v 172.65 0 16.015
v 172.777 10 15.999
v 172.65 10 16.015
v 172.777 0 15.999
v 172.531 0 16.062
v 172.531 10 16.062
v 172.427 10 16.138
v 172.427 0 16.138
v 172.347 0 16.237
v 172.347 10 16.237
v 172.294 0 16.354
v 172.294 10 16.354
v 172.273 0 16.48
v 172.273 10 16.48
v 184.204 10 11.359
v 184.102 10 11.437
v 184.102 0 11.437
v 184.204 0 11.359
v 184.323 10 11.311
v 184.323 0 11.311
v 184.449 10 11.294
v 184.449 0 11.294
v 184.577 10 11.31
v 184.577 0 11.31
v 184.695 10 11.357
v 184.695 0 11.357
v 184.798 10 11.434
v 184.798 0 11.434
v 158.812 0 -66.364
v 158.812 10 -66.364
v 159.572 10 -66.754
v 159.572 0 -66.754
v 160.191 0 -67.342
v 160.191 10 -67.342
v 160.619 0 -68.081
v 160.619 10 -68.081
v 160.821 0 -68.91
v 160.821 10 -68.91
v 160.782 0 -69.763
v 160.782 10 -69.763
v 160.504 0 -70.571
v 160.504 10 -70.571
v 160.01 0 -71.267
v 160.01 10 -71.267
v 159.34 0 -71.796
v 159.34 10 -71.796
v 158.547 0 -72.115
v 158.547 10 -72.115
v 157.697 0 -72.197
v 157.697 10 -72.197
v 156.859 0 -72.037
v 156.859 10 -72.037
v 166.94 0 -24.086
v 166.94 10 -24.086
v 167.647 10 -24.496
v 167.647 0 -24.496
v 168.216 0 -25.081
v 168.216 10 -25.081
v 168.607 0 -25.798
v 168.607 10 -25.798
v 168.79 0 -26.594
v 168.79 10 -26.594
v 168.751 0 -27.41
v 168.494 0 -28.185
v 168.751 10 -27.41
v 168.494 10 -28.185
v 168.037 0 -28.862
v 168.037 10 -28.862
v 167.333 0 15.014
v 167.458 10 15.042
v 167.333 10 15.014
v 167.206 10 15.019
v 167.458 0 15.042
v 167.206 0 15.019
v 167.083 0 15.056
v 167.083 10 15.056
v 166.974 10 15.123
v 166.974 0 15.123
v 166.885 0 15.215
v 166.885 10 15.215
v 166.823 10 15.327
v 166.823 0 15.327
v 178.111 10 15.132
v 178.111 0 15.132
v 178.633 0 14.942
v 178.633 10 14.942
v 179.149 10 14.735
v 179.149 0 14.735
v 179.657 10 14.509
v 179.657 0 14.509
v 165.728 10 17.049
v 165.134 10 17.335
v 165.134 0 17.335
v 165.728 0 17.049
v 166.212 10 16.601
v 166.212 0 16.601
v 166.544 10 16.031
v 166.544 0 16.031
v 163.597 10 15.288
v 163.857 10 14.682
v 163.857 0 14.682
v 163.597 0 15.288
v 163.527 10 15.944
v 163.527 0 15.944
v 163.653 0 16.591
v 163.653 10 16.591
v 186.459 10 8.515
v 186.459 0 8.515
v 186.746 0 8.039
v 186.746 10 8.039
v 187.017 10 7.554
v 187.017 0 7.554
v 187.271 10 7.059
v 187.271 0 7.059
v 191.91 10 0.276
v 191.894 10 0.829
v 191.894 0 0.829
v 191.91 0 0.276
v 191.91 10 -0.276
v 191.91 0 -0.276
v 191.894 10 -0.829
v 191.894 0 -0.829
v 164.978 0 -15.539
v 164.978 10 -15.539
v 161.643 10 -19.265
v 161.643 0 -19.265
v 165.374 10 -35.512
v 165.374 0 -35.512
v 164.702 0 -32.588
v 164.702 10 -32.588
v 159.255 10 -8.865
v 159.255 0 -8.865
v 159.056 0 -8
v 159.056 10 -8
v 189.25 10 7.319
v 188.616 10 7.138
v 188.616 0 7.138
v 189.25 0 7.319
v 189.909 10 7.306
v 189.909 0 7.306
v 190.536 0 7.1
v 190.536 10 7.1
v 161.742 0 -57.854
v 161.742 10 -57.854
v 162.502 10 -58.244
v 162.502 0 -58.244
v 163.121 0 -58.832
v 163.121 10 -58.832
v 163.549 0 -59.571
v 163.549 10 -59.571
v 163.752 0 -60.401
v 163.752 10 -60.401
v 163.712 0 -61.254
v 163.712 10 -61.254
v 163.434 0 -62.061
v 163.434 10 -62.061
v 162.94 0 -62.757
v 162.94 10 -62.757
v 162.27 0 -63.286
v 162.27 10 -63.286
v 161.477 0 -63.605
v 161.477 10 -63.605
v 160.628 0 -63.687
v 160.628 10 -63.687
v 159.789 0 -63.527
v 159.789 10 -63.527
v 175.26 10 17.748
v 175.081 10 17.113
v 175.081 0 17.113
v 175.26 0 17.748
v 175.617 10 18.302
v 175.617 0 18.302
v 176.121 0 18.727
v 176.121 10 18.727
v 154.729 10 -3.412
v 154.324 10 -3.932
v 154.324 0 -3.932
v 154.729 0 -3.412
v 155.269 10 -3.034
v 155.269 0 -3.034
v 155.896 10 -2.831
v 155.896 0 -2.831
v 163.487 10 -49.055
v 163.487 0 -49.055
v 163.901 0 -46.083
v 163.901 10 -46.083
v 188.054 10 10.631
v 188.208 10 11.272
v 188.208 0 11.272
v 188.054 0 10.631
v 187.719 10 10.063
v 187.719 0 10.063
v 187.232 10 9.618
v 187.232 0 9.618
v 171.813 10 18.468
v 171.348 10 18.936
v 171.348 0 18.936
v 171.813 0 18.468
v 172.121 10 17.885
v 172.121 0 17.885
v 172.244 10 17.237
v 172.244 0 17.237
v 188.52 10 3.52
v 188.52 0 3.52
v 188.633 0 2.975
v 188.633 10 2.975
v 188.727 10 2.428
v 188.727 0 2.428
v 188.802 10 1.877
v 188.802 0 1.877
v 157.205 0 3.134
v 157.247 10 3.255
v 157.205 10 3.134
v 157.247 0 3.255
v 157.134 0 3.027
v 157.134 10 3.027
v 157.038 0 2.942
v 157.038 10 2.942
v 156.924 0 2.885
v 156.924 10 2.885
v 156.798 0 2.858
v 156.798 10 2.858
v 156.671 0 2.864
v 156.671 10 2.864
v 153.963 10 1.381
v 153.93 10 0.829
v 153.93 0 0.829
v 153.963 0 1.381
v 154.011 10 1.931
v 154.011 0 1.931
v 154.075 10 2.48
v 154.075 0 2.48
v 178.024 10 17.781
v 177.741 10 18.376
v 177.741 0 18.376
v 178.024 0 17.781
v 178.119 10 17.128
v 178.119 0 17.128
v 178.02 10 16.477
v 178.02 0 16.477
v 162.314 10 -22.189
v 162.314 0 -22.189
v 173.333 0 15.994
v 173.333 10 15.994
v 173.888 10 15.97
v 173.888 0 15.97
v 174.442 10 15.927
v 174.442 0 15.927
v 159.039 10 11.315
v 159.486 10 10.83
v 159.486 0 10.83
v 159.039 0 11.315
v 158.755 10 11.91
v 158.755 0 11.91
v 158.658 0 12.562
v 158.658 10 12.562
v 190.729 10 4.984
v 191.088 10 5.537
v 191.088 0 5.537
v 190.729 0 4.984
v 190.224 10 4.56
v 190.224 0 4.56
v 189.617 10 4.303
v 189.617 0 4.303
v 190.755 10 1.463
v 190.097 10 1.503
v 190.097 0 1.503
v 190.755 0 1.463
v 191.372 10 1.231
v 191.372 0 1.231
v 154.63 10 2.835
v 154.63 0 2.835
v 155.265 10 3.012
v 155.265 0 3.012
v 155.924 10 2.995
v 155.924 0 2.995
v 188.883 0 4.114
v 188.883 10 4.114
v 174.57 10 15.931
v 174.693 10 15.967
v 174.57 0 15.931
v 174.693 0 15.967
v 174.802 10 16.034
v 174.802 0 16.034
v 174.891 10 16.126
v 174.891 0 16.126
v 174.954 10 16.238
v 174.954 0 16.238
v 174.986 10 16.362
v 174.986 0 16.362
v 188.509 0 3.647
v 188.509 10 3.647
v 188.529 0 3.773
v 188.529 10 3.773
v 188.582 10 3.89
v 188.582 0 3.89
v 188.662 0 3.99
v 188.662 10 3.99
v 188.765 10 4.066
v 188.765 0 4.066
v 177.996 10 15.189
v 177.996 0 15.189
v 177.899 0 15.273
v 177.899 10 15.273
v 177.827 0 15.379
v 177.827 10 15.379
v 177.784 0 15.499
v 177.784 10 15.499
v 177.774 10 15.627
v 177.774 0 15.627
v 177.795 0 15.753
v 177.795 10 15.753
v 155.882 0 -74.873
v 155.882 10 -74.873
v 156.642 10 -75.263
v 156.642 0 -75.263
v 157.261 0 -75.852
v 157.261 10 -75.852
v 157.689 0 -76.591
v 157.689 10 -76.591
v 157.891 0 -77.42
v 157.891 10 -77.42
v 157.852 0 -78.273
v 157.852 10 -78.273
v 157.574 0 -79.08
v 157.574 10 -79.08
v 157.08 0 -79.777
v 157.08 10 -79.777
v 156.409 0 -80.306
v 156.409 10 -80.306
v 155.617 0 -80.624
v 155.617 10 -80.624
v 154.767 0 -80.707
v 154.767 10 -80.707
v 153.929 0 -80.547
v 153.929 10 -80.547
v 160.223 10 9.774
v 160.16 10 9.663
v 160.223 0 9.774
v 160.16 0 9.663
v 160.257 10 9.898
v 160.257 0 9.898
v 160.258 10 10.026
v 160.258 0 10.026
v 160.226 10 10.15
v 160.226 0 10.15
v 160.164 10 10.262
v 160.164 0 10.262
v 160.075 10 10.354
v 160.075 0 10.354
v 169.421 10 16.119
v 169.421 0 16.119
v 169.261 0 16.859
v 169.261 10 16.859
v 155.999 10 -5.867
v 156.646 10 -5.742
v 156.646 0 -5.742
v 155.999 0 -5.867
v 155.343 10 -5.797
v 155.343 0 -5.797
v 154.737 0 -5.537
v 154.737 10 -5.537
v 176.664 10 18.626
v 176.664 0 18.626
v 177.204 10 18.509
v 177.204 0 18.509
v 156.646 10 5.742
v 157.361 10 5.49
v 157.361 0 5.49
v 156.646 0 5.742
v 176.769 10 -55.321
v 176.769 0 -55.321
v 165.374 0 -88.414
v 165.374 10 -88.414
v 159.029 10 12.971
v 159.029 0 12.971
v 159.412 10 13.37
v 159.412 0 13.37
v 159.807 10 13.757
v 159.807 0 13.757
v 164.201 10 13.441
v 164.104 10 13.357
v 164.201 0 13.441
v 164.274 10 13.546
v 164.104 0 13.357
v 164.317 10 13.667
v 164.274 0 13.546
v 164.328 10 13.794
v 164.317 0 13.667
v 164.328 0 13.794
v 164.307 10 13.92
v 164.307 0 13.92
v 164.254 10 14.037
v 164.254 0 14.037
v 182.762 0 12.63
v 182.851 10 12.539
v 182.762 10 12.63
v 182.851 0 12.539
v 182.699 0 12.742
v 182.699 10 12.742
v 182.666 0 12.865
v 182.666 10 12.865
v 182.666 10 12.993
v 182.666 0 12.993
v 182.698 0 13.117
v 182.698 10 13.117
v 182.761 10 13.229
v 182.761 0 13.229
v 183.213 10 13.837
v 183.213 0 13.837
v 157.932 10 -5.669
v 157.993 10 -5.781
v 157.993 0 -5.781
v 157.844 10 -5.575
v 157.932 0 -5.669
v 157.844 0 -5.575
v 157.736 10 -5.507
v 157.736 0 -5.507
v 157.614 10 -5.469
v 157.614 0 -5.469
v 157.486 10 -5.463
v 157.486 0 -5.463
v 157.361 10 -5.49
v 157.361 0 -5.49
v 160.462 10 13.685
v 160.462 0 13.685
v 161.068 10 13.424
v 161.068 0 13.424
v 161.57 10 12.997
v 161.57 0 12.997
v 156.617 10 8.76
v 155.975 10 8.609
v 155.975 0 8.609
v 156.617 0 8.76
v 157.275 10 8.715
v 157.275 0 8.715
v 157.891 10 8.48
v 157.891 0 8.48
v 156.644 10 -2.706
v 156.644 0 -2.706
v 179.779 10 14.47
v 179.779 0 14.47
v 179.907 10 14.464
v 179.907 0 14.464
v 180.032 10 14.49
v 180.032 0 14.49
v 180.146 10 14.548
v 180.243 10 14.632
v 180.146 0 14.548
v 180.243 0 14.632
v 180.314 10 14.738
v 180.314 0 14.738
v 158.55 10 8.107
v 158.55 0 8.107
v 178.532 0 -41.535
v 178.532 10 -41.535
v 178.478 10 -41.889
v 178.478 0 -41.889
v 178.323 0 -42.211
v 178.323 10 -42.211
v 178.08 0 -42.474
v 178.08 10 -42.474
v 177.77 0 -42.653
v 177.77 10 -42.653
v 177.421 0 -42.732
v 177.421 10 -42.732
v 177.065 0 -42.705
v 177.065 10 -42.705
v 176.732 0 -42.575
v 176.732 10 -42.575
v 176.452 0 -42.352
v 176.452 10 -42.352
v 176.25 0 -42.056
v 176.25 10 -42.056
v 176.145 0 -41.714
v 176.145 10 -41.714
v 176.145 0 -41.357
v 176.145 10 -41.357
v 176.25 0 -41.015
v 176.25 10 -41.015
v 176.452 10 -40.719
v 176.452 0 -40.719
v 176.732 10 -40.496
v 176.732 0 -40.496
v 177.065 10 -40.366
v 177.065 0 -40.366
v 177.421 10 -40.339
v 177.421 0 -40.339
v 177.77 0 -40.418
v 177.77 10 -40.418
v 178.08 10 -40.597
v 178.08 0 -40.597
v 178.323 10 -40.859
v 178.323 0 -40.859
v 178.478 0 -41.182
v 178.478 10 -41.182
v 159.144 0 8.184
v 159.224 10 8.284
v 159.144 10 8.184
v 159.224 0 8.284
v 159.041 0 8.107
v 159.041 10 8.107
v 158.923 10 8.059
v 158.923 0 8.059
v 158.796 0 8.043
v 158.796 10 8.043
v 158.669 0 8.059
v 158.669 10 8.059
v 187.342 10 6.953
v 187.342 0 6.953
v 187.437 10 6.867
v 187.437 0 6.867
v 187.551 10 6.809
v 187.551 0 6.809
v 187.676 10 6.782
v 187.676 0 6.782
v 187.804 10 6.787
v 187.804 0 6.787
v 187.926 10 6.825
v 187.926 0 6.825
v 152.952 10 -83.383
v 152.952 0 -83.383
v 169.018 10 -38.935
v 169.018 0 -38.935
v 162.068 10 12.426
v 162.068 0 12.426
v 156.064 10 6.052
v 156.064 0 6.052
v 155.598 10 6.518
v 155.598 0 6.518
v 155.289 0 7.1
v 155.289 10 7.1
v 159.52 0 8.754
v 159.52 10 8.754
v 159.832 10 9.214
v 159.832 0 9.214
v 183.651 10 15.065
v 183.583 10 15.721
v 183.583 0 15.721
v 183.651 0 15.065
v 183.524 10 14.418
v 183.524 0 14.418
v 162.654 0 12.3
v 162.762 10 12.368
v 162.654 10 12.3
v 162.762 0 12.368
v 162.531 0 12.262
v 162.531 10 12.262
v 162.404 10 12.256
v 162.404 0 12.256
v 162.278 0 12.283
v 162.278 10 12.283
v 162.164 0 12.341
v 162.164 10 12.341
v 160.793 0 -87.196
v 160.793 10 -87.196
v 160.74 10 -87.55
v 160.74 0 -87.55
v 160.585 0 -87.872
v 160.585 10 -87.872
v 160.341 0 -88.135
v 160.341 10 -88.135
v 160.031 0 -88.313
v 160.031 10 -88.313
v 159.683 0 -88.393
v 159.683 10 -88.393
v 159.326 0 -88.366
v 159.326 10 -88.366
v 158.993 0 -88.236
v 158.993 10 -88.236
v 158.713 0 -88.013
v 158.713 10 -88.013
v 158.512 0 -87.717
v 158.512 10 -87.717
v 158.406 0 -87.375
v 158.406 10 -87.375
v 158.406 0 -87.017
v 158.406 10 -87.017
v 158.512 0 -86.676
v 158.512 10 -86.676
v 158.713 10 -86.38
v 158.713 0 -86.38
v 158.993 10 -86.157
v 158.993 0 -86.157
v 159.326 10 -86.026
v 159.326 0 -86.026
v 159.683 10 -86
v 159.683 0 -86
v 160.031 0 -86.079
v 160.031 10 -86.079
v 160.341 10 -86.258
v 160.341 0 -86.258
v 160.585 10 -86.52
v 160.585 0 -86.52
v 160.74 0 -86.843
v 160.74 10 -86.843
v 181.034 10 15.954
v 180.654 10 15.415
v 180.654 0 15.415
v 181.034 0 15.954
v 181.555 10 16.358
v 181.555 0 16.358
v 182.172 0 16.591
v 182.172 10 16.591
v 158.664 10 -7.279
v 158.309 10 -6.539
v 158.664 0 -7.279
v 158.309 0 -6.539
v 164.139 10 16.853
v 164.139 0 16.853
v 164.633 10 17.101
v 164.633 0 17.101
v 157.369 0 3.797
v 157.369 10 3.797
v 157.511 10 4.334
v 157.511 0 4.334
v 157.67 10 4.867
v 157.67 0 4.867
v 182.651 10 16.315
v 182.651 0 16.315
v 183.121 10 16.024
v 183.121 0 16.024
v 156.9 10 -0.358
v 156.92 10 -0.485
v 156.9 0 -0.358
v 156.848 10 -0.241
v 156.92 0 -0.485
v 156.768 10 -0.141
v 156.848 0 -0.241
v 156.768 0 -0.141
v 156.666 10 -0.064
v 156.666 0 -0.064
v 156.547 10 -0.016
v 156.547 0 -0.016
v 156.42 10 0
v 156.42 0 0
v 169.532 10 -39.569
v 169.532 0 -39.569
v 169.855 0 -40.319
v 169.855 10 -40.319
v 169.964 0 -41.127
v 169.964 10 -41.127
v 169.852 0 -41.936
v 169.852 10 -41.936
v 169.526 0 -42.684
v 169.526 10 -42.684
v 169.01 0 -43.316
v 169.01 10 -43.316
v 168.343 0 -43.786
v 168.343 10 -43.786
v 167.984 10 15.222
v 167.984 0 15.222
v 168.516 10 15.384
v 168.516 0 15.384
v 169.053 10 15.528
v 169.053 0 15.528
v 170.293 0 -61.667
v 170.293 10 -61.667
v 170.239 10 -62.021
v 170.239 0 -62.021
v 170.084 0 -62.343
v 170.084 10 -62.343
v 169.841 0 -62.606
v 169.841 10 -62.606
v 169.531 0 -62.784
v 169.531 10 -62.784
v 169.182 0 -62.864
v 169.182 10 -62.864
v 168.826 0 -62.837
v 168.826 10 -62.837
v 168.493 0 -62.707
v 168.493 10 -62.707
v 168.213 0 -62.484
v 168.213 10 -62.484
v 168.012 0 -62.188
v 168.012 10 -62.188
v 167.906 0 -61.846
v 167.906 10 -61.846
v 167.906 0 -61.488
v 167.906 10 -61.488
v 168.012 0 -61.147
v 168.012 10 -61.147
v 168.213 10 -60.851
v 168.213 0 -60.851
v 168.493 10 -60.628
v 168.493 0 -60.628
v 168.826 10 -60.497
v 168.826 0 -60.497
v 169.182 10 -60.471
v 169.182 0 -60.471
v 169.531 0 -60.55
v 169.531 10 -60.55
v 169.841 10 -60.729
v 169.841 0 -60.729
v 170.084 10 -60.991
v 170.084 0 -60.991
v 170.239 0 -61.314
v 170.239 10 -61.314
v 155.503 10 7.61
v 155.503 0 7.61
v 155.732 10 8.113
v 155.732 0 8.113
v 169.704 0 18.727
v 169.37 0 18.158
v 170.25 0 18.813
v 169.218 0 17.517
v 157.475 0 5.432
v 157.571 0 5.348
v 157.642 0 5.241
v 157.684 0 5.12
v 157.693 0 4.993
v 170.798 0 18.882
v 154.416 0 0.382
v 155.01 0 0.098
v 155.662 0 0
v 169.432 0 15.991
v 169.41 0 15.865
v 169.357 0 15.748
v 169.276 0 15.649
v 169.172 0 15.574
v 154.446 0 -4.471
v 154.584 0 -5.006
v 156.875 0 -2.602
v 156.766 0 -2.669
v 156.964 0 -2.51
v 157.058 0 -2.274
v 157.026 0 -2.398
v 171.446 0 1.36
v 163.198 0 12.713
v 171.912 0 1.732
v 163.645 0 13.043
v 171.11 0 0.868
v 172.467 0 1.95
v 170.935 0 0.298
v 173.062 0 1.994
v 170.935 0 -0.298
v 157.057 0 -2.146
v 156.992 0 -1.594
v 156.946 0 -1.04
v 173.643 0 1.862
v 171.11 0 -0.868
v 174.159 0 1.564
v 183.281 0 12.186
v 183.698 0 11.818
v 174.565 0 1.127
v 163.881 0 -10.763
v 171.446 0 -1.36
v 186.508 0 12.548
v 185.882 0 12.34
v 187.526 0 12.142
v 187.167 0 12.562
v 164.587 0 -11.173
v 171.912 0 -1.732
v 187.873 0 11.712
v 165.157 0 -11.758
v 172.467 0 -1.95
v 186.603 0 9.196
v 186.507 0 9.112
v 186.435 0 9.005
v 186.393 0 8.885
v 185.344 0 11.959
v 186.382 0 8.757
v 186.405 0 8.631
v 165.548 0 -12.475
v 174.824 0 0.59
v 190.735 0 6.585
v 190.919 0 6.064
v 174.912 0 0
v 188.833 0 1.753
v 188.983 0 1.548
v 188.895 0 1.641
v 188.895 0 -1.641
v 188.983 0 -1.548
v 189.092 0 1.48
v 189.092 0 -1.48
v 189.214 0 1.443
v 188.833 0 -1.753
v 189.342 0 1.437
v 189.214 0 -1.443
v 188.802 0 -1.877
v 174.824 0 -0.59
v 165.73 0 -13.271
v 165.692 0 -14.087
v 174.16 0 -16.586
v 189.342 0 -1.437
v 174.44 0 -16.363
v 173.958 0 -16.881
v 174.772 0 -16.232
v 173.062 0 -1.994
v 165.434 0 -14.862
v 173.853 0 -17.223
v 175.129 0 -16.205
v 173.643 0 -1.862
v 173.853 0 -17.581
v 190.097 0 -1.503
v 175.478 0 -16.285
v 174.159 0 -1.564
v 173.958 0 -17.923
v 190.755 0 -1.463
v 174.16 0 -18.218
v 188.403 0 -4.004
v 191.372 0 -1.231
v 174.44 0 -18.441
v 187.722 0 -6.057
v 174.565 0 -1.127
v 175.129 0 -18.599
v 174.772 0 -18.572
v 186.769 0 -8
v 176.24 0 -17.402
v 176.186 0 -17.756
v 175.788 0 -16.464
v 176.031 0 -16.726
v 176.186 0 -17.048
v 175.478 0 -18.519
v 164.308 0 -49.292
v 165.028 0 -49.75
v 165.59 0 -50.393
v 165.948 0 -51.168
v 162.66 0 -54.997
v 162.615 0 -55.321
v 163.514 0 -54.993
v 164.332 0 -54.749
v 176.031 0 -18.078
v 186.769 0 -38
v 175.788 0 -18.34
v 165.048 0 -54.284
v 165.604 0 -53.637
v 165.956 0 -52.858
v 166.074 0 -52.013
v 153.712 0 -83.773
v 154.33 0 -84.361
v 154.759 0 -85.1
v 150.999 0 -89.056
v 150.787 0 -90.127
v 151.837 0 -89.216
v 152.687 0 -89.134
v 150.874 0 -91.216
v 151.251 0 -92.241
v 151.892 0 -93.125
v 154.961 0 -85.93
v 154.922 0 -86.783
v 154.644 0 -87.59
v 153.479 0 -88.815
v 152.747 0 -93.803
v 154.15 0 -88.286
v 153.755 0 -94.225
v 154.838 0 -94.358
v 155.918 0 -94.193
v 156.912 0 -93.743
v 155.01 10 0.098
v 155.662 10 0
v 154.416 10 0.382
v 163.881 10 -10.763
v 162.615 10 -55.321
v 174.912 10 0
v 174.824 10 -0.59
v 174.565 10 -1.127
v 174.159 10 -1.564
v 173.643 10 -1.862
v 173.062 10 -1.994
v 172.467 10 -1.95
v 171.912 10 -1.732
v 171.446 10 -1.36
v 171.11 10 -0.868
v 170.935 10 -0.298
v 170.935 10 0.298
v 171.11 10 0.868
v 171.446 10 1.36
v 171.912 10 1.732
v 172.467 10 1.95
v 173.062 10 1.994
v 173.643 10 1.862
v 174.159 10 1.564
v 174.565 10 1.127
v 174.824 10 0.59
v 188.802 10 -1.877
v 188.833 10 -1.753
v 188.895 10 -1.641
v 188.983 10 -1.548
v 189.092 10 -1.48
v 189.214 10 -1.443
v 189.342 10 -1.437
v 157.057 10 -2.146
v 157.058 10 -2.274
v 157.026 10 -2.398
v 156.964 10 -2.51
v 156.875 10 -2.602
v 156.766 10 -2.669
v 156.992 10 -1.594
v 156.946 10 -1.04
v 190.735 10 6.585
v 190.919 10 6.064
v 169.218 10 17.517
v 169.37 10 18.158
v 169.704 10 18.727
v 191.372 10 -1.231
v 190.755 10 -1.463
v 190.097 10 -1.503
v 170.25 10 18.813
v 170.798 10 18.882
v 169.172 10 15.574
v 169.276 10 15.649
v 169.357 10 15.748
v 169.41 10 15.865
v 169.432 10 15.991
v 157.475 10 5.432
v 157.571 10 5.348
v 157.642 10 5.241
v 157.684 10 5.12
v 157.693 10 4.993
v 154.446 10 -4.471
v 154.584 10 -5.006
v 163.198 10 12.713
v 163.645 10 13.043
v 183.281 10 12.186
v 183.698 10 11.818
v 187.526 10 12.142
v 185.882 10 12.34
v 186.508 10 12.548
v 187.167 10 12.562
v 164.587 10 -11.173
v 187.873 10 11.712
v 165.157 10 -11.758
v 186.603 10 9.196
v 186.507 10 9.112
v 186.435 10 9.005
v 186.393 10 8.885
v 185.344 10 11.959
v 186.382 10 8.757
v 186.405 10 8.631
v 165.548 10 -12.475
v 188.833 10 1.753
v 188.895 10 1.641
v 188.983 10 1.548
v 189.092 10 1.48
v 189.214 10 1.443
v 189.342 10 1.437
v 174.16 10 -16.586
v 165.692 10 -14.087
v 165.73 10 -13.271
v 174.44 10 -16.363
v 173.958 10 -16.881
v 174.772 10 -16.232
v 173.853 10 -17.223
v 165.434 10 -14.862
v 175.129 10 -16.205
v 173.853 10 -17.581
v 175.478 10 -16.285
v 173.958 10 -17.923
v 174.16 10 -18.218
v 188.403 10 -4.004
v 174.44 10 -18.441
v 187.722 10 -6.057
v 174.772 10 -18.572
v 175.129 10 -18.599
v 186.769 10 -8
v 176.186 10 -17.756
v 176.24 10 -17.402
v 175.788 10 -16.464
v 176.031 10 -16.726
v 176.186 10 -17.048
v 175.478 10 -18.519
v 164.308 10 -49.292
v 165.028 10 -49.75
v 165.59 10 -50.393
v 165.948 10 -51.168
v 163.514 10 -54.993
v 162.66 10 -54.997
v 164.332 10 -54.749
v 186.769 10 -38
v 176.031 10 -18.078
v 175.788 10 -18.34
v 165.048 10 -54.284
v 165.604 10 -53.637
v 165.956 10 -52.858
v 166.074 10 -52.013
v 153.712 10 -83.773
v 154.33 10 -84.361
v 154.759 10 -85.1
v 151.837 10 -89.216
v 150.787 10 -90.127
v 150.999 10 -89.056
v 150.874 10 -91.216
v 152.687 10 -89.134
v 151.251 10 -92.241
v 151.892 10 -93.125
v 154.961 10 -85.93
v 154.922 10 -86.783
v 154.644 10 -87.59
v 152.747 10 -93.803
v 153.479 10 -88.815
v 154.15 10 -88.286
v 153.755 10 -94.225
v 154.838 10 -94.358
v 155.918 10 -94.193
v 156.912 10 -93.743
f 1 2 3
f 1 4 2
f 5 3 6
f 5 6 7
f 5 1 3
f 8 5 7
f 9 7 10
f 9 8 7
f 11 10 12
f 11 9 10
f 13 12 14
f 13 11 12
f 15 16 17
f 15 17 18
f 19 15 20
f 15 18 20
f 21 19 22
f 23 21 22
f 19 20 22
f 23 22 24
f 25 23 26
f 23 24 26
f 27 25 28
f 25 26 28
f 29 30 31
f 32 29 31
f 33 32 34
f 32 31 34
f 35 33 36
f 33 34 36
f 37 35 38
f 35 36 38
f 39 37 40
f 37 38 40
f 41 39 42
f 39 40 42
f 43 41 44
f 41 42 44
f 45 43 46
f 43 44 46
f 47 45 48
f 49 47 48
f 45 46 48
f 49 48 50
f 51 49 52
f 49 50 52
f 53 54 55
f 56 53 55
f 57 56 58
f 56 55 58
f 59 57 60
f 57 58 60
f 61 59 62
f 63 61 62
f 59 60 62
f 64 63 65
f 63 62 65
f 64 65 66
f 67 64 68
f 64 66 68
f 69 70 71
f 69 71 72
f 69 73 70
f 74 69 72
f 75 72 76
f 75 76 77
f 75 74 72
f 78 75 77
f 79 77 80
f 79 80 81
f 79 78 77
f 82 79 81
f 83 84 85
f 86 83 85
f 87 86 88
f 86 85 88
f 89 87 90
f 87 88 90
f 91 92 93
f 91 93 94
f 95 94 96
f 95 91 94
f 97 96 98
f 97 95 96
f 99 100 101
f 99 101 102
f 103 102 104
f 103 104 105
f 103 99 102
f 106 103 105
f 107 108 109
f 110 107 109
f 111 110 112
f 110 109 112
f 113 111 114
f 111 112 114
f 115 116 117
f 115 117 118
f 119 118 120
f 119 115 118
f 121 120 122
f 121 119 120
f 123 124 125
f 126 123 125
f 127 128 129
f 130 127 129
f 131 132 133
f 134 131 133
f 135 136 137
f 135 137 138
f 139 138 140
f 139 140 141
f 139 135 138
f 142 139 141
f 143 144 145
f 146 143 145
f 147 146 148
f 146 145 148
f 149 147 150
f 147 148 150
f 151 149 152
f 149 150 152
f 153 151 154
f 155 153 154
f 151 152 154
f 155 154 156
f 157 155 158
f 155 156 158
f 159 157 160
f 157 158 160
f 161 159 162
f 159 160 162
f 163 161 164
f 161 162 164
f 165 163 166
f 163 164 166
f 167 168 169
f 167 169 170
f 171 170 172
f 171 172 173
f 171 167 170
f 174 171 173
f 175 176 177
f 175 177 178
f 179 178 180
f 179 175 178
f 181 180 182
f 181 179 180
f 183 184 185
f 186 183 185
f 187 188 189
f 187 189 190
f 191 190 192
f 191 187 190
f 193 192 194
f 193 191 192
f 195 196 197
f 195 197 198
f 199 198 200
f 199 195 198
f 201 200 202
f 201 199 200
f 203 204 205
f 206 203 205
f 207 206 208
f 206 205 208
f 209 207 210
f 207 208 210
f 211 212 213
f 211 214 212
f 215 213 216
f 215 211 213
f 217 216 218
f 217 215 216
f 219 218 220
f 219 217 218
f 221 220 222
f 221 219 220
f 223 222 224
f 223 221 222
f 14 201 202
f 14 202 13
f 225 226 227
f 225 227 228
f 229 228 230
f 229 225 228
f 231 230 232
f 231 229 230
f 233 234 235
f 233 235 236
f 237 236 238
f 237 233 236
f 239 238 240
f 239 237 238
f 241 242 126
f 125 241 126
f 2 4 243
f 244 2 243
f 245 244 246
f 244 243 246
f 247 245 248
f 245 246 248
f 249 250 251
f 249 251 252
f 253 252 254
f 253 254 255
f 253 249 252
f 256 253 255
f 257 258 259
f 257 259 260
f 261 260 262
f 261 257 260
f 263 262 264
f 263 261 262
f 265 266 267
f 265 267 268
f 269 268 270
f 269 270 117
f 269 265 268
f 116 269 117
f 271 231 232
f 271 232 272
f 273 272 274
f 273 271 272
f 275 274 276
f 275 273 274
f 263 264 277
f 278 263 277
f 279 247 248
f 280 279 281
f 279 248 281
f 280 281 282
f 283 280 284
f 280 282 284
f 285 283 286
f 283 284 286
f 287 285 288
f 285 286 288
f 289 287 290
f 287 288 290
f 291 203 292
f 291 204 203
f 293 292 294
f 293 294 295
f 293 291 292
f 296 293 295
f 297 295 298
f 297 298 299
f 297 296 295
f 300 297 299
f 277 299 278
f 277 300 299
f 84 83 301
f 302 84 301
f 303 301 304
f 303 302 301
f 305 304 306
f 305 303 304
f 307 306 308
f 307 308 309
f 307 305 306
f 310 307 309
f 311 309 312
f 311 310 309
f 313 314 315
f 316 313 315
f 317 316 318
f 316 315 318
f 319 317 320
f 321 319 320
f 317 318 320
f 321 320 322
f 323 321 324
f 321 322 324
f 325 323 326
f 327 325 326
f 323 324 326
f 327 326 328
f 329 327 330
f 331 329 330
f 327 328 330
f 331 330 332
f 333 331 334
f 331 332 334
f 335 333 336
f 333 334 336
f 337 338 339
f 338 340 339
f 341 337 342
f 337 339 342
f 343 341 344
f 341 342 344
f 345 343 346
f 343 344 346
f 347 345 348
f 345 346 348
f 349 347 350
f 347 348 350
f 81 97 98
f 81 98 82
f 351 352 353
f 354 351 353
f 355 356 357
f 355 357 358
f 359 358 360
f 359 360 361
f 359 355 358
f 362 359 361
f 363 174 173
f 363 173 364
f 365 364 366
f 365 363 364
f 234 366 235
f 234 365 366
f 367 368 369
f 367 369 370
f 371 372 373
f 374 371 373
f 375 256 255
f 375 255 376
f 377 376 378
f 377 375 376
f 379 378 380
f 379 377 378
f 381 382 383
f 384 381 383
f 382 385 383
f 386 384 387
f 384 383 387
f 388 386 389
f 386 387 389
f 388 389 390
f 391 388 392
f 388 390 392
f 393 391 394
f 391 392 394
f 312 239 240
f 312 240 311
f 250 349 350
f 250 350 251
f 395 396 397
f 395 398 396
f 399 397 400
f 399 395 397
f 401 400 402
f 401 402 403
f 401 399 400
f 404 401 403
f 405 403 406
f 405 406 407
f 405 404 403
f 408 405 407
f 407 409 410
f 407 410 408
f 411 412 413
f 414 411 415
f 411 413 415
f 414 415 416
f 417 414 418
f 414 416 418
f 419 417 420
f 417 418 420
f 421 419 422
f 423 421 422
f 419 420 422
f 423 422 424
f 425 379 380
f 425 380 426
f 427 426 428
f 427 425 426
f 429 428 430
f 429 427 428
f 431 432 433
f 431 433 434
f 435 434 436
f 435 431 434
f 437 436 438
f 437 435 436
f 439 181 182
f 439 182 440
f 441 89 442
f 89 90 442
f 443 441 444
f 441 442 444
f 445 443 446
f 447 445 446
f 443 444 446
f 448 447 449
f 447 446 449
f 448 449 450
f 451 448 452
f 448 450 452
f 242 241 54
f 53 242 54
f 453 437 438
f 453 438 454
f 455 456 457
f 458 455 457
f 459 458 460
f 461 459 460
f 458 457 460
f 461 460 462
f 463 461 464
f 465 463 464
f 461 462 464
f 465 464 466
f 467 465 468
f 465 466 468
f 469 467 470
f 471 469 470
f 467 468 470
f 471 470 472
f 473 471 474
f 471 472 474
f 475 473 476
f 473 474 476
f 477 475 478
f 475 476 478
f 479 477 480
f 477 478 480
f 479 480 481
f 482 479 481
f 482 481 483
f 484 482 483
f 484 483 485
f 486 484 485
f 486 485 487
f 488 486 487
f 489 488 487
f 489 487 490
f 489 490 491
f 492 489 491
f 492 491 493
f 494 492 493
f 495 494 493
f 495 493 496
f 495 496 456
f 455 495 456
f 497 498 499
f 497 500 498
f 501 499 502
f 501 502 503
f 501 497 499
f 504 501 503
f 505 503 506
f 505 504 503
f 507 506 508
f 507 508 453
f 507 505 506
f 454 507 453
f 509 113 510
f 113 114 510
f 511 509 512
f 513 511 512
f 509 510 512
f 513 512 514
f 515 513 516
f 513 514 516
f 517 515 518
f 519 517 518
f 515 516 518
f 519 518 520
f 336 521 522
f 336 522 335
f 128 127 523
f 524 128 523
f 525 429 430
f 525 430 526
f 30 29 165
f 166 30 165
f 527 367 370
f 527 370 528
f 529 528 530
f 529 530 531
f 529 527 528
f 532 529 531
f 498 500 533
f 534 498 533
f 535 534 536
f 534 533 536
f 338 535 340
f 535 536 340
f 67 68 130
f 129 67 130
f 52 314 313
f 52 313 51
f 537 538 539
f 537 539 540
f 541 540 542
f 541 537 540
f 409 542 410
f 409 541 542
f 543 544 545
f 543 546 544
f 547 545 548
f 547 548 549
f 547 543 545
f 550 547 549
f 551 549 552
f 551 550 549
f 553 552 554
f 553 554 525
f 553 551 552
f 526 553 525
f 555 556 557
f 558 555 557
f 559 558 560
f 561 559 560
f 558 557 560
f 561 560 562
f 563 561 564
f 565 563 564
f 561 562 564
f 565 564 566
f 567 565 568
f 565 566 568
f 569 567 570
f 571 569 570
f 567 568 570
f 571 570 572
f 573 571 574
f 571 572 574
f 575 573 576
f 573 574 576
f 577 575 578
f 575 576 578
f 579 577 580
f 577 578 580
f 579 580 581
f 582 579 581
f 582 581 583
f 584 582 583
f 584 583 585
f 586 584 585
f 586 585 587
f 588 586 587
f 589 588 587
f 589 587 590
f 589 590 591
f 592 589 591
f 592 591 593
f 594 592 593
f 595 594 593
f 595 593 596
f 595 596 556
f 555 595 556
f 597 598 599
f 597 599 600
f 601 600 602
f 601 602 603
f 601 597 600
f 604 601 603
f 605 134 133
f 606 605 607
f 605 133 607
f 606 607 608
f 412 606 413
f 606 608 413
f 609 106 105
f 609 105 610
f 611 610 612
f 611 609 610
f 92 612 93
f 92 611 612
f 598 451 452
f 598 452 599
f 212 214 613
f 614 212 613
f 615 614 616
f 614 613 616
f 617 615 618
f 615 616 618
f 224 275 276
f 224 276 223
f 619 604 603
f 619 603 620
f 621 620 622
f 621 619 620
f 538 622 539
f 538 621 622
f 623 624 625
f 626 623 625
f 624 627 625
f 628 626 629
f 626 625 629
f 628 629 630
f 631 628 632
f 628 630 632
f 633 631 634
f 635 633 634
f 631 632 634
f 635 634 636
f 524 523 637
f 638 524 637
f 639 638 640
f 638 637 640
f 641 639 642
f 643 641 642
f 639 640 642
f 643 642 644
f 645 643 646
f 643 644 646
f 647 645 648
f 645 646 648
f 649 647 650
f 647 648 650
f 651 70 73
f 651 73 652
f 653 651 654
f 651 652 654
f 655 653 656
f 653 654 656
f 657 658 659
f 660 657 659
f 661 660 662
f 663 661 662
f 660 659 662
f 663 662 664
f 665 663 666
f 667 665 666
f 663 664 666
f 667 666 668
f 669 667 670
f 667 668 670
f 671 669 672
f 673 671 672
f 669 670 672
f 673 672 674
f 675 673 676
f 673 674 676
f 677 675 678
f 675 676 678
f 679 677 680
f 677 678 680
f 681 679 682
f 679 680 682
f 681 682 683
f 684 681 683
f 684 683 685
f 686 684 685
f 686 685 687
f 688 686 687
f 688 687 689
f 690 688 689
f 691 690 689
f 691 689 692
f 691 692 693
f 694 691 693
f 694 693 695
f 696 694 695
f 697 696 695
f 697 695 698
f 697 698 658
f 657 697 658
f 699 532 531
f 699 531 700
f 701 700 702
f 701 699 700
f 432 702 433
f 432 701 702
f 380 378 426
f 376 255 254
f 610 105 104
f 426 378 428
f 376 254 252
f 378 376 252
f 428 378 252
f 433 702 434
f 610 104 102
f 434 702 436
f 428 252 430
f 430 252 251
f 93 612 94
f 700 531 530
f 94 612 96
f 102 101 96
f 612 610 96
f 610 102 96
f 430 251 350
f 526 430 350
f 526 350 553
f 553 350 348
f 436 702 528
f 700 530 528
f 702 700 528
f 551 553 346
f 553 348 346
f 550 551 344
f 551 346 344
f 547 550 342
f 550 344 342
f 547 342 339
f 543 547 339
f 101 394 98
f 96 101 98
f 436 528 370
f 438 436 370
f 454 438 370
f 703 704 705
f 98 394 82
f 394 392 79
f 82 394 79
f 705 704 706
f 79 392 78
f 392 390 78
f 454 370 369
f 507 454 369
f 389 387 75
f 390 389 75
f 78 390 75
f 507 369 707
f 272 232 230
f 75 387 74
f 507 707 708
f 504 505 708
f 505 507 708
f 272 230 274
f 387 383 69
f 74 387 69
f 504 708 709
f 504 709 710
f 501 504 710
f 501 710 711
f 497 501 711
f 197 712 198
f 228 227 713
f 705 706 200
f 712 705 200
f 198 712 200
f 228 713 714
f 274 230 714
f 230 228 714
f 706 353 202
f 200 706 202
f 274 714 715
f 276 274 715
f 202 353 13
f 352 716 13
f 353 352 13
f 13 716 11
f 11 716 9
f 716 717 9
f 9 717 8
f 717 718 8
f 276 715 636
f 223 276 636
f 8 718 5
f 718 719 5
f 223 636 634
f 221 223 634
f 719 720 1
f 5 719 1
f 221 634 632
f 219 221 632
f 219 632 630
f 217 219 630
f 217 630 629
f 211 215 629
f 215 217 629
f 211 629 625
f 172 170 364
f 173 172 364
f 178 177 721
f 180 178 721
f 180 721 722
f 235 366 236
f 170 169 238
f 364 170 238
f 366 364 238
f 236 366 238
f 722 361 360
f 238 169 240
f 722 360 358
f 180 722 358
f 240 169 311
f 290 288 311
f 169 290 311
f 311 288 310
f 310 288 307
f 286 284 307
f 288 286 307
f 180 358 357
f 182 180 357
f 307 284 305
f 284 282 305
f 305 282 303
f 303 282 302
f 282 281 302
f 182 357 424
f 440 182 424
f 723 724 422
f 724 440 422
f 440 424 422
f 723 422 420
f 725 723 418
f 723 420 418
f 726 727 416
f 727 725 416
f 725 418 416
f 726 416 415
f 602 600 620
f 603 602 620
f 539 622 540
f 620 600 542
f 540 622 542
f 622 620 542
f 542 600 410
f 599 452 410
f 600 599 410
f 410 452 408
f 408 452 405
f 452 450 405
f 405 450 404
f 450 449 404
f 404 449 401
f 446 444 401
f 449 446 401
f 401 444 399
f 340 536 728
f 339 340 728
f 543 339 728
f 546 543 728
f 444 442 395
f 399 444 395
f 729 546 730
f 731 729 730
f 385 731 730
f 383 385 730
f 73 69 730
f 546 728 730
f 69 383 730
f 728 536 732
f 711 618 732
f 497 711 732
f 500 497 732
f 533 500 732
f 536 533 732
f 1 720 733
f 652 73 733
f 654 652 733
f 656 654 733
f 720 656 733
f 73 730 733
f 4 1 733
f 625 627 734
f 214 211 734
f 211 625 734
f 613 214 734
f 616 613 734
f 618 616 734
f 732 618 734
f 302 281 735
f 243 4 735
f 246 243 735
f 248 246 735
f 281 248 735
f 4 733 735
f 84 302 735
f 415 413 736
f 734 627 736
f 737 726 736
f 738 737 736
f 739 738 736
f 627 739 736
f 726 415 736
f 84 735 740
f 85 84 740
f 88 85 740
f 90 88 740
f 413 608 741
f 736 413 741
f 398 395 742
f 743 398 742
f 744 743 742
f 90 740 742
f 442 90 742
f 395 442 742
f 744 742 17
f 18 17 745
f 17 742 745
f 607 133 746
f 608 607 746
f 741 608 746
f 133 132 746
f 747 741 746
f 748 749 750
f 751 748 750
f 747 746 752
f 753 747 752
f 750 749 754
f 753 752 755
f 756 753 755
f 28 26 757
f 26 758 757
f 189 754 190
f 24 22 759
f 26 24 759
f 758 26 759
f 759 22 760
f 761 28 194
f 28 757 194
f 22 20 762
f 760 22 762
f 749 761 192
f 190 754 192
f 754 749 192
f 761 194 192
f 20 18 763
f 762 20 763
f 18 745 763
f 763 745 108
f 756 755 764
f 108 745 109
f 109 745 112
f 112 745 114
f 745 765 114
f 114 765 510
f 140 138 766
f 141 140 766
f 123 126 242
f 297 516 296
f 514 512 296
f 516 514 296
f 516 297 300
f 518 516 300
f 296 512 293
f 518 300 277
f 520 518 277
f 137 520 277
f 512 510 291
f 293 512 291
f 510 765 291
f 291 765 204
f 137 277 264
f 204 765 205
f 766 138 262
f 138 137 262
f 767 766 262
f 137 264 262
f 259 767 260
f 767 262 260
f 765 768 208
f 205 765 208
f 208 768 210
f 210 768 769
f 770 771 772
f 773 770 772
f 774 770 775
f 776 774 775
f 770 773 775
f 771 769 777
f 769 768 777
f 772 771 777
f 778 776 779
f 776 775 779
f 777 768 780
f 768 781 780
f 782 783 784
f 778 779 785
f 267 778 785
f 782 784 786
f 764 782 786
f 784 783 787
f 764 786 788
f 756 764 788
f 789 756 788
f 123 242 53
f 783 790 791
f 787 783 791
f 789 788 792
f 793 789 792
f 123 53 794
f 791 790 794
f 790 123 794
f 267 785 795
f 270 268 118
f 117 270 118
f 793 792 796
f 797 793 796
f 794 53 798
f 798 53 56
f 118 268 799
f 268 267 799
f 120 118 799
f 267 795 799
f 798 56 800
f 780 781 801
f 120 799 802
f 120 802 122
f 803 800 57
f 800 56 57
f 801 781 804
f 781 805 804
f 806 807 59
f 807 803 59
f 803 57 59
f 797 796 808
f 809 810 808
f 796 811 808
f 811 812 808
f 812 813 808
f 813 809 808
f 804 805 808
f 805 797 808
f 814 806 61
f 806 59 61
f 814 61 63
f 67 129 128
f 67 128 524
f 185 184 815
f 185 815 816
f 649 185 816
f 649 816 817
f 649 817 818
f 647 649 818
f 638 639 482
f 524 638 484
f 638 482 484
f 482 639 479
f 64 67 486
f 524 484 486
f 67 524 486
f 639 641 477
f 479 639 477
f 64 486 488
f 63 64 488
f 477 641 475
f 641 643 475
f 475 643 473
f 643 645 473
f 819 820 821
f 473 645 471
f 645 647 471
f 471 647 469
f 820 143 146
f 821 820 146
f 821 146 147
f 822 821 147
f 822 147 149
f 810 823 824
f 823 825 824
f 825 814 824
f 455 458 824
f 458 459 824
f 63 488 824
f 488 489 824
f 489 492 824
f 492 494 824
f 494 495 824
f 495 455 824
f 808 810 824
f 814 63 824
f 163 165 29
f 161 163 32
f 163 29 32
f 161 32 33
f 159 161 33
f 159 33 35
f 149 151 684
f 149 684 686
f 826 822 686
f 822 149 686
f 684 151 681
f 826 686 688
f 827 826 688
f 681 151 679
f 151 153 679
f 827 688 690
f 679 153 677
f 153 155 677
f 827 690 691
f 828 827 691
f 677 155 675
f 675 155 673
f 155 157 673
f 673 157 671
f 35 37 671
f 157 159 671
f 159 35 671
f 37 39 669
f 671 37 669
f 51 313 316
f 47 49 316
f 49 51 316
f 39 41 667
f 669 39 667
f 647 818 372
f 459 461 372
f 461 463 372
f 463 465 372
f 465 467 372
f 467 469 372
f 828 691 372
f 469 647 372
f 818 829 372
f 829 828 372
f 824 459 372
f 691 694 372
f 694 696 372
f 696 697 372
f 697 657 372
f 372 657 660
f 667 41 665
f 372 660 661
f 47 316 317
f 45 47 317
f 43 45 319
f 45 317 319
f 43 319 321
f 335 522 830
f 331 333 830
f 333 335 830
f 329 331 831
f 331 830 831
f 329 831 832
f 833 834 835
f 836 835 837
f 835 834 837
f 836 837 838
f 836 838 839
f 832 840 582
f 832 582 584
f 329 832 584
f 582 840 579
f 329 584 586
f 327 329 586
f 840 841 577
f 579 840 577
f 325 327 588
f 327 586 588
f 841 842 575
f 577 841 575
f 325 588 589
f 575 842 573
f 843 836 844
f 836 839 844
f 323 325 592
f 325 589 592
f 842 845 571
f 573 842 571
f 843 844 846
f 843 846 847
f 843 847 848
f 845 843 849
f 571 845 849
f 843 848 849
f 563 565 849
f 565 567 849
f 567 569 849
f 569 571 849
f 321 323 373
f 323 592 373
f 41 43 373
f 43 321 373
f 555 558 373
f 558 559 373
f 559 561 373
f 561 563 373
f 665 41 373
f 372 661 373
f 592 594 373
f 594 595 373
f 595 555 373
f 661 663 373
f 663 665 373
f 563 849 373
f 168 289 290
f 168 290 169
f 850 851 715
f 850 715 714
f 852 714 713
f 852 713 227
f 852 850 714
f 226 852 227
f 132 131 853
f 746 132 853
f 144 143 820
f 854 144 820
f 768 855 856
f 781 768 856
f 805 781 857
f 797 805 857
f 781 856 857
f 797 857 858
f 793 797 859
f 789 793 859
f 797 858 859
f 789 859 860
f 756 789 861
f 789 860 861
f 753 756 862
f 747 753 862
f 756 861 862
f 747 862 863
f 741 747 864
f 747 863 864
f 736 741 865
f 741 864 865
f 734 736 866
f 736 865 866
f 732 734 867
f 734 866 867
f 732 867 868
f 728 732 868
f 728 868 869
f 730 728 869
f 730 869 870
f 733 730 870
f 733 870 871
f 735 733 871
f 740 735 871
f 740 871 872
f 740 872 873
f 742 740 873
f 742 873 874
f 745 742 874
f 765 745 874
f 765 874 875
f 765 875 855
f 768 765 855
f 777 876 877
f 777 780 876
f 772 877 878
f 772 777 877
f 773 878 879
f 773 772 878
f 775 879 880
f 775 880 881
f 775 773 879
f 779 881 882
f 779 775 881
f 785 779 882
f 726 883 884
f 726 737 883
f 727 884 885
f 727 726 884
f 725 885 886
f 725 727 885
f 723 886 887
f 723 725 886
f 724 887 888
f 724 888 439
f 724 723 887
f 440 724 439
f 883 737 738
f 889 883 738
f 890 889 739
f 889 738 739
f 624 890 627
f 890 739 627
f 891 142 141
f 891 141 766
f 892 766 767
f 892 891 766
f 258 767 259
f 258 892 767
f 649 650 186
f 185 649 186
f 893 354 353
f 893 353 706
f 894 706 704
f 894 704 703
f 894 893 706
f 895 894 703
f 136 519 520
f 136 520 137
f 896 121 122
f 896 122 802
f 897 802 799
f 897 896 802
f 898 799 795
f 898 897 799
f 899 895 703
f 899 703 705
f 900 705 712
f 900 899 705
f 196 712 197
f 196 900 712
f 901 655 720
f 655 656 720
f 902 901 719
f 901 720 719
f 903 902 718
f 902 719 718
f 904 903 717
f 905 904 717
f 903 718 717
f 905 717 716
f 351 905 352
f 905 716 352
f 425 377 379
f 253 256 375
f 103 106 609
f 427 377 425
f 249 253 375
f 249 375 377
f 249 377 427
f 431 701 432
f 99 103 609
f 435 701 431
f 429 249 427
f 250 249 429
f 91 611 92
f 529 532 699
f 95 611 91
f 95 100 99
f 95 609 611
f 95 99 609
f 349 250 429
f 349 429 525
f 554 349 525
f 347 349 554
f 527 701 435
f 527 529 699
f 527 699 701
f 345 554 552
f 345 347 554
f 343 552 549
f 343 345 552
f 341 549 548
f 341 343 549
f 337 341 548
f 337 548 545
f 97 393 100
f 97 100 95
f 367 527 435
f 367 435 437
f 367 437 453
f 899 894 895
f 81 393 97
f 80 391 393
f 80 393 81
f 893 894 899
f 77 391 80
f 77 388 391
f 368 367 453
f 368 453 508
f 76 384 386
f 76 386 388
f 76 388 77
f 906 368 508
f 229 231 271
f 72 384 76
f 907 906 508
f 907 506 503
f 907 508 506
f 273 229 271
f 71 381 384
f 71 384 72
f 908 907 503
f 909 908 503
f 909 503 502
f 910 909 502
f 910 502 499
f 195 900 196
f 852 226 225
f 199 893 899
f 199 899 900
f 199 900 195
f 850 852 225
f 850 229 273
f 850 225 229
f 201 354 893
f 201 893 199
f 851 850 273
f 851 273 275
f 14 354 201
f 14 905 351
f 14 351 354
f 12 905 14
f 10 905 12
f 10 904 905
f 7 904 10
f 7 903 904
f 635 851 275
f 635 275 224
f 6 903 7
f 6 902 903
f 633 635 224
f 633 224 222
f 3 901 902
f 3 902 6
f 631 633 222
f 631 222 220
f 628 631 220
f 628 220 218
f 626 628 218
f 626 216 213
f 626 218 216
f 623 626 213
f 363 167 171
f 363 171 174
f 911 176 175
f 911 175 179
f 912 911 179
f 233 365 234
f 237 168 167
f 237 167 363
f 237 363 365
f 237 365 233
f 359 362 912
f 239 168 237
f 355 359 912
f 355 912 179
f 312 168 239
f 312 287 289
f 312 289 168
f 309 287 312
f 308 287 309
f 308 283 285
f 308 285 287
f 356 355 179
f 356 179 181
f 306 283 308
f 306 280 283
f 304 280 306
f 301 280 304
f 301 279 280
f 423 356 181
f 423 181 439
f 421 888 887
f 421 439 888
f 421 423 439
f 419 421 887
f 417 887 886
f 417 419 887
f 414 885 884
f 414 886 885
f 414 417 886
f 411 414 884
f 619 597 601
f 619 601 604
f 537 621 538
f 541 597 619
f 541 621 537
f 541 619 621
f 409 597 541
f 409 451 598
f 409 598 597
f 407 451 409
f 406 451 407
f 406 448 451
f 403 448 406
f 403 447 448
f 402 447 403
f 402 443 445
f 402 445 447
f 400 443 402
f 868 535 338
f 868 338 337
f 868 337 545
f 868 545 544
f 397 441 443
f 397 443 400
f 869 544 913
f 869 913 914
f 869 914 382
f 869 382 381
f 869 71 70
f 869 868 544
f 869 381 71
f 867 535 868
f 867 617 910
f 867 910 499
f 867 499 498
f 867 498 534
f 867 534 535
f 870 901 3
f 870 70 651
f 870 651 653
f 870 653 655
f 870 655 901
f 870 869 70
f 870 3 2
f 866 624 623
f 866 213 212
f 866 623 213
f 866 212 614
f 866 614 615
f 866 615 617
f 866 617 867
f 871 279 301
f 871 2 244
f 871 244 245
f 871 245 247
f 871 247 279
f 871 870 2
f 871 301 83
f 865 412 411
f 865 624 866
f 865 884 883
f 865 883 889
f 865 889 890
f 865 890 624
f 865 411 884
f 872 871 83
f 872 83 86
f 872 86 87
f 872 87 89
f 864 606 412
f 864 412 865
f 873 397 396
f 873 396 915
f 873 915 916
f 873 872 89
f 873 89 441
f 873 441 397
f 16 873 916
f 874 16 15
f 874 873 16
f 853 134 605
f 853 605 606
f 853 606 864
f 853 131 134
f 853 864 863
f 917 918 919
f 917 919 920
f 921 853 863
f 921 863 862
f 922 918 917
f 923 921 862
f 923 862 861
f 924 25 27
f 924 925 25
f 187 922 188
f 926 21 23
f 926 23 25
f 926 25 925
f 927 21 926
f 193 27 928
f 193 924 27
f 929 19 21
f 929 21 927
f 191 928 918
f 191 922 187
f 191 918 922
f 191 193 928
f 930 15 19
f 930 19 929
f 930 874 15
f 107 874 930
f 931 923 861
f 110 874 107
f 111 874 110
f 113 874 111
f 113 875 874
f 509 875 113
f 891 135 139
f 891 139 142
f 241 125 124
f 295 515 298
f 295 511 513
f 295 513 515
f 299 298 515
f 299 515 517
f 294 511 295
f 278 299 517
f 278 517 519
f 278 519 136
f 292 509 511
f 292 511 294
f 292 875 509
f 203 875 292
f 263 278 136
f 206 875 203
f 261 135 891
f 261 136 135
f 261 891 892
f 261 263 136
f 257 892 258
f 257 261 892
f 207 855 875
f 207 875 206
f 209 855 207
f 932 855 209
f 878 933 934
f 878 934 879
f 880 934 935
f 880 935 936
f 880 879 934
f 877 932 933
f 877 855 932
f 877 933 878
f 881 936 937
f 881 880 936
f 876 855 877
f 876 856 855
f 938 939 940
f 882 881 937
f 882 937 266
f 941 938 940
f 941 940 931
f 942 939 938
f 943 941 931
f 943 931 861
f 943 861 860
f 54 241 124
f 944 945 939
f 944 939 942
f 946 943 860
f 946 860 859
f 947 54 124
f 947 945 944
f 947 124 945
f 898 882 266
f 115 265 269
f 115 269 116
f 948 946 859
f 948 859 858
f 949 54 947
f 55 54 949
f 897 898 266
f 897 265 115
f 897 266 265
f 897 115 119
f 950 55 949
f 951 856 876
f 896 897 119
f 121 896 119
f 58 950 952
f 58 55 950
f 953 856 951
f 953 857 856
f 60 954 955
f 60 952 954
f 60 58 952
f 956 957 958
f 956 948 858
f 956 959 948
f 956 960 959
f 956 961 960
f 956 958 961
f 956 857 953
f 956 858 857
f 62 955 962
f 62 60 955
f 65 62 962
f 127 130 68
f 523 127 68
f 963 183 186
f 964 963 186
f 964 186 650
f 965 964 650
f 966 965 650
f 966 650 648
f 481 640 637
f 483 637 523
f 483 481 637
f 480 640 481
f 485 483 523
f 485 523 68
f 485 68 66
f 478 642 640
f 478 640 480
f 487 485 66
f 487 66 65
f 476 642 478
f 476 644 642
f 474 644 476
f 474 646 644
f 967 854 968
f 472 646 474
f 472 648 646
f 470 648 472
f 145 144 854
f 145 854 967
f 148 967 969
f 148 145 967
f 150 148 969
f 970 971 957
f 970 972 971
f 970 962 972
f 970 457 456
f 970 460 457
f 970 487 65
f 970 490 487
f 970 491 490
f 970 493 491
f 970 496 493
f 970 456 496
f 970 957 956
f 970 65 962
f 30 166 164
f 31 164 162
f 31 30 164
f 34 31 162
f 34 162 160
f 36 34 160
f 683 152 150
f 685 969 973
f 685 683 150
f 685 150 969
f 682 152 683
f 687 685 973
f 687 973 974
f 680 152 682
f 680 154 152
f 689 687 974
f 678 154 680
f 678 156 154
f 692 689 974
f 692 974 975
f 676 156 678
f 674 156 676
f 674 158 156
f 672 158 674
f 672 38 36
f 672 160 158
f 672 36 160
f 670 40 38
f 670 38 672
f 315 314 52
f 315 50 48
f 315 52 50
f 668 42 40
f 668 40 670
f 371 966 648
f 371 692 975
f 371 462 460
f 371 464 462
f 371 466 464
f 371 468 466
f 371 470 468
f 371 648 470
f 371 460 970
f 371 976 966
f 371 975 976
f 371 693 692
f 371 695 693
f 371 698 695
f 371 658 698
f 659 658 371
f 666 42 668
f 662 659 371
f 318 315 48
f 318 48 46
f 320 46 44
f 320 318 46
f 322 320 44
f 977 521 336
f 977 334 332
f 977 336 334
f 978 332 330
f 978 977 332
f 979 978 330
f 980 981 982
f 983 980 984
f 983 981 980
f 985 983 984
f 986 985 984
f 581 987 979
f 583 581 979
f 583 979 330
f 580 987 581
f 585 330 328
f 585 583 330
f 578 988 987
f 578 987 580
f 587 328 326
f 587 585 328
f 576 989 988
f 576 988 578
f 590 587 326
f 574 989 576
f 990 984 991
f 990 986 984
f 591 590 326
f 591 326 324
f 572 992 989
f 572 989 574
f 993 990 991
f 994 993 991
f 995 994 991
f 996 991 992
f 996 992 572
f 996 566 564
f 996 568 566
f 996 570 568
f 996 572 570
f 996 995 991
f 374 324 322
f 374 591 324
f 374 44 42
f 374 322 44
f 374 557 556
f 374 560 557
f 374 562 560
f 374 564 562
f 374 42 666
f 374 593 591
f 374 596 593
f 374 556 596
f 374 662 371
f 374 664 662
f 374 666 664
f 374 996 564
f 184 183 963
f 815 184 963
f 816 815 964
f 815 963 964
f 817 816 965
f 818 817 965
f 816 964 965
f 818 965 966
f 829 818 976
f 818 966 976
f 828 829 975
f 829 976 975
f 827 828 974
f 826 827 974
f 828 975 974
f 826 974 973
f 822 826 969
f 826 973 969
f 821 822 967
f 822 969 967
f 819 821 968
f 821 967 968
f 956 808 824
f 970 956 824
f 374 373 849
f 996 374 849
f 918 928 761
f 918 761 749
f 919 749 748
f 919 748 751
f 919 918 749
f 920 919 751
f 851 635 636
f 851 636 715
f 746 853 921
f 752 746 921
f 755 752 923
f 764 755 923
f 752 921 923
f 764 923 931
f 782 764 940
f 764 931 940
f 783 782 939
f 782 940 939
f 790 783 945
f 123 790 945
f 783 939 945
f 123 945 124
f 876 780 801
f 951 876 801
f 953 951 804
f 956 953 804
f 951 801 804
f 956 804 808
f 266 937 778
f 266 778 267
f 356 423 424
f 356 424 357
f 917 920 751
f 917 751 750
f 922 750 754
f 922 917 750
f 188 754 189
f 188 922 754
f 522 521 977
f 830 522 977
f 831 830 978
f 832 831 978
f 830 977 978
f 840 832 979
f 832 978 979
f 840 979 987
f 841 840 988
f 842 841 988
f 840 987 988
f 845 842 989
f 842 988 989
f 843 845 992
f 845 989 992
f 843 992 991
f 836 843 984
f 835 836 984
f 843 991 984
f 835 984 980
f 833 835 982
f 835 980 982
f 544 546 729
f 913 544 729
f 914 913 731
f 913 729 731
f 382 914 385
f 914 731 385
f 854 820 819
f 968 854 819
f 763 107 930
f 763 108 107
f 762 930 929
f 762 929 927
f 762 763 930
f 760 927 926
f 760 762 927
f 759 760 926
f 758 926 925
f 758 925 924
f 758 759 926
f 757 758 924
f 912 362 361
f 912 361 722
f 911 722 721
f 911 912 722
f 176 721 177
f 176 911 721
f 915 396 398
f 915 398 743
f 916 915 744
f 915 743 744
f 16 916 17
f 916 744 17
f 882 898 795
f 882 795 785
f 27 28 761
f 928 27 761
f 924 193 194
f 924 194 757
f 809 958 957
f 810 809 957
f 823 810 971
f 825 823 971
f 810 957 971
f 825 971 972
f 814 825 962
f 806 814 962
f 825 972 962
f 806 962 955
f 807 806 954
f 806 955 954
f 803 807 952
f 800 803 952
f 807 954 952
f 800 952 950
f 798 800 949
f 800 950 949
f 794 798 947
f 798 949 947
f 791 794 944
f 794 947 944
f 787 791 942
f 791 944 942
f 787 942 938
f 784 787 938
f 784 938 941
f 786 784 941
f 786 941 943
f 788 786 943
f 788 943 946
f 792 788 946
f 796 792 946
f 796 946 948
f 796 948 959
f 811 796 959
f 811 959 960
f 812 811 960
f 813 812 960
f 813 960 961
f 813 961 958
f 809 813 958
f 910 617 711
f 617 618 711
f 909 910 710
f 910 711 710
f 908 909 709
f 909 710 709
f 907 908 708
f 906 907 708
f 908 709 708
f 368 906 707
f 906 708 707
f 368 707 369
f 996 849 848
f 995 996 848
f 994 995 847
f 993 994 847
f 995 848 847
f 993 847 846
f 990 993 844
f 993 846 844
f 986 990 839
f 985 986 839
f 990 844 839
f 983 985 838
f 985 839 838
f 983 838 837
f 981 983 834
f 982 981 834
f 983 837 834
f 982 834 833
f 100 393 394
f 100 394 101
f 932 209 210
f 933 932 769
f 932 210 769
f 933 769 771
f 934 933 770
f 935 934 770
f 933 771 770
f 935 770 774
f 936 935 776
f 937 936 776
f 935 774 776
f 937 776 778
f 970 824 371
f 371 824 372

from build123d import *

# Parameters (mm, degrees)
SKETCH1_R                = 16
BOSS_EXTRUDE1_DEPTH      = 10
CUT_EXTRUDE1_DEPTH       = 10
BOSS_EXTRUDE2_DEPTH      = 10
FILLET1_R                = 0.5
CIRPATTERN1_COUNT        = 19
CIRPATTERN1_ANGLE        = 350
FILLET1_OF_CIRPATTERN1_R = 0.5
SKETCH4_R                = 2
CUT_EXTRUDE2_DEPTH       = 11
SKETCH5_R                = 1.2
CUT_EXTRUDE3_DEPTH       = 11


with BuildPart() as part:
    # Sketch1 → Boss-Extrude1 (new body)
    with BuildSketch(Plane(origin=(0, 0, 0), x_dir=(1, 0, 0), z_dir=(0, 1, 0))):
        with BuildLine():
            Line((162.614680299, 55.320508076), (165.373914051, 35.511756749))
            Line((165.373914051, 35.511756749), (159.055986536, 8))
            ThreePointArc((159.055986536, 8), (172.912392996, 16), (186.768799457, 8))
            Line((186.768799457, 8), (186.768799457, 38))
            Line((186.768799457, 38), (176.768799457, 55.320508076))
            Line((176.768799457, 55.320508076), (165.373914051, 88.413658222))
            Line((165.373914051, 88.413658222), (156.912392996, 93.743072959))
            ThreePointArc((156.912392996, 93.743072959), (152.296156749, 93.493334083), (150.998552799, 89.056191919))
            Line((150.998552799, 89.056191919), (162.614680299, 55.320508076))
        make_face()
        with Locations((172.912392996, 0)):
            Circle(SKETCH1_R)
    extrude(amount=BOSS_EXTRUDE1_DEPTH)

    # Sketch2 → Cut-Extrude1 (cut)
    with BuildSketch(Plane(origin=(0, 10, 0), x_dir=(1, 0, 0), z_dir=(0, 1, 0))):
        with BuildLine():
            Line((150.998552799, 89.056191919), (152.951961726, 83.383080466))
            ThreePointArc((152.951961726, 83.383080466), (154.811812989, 87.196340656), (150.998552799, 89.056191919))
        make_face()
        with BuildLine():
            Line((153.928666189, 80.546524739), (155.882075116, 74.873413285))
            ThreePointArc((155.882075116, 74.873413285), (157.741926379, 78.686673476), (153.928666189, 80.546524739))
        make_face()
        with BuildLine():
            Line((156.858779579, 72.036857559), (158.812188506, 66.363746105))
            ThreePointArc((158.812188506, 66.363746105), (160.672039769, 70.177006295), (156.858779579, 72.036857559))
        make_face()
        with BuildLine():
            Line((159.788892969, 63.527190378), (161.742301896, 57.854078925))
            ThreePointArc((161.742301896, 57.854078925), (163.602153159, 61.667339115), (159.788892969, 63.527190378))
        make_face()
        with BuildLine():
            Line((162.659719683, 54.997166876), (163.487489808, 49.054541478))
            ThreePointArc((163.487489808, 49.054541478), (166.044917445, 52.43973924), (162.659719683, 54.997166876))
        make_face()
        with BuildLine():
            Line((163.901374871, 46.083228779), (165.373914051, 35.511756749))
            Line((165.373914051, 35.511756749), (169.018329151, 38.934948035))
            ThreePointArc((169.018329151, 38.934948035), (169.935727078, 41.535482158), (168.342564959, 43.786311148))
            Line((168.342564959, 43.786311148), (163.901374871, 46.083228779))
        make_face()
        with BuildLine():
            Line((168.037228767, 28.862370748), (164.702457837, 32.587864386))
            Line((164.702457837, 32.587864386), (162.314311904, 22.18855388))
            Line((162.314311904, 22.18855388), (166.940336365, 24.085893514))
            ThreePointArc((166.940336365, 24.085893514), (168.725824948, 26.190051977), (168.037228767, 28.862370748))
        make_face()
        with BuildLine():
            Line((164.977626621, 15.539167879), (161.642855691, 19.264661516))
            Line((161.642855691, 19.264661516), (159.254709758, 8.86535101))
            Line((159.254709758, 8.86535101), (163.880734219, 10.762690644))
            ThreePointArc((163.880734219, 10.762690644), (165.666222802, 12.866849107), (164.977626621, 15.539167879))
        make_face()
    extrude(amount=-CUT_EXTRUDE1_DEPTH, mode=Mode.SUBTRACT)

    # Sketch3 → Boss-Extrude2 (add)
    with BuildSketch(Plane(origin=(0, 10, 0), x_dir=(1, 0, 0), z_dir=(0, 1, 0))):
        with BuildLine():
            Line((190.096751538, 1.503436562), (188.851508166, 1.394491884))
            ThreePointArc((188.851508166, 1.394491884), (188.912392996, 0), (188.851508166, -1.394491884))
            Line((188.851508166, -1.394491884), (190.096751538, -1.503436562))
            ThreePointArc((190.096751538, -1.503436562), (191.072085254, -1.370072078), (191.894309206, -0.82876836))
            ThreePointArc((191.894309206, -0.82876836), (191.912392996, 0), (191.894309206, 0.82876836))
            ThreePointArc((191.894309206, 0.82876836), (191.072085254, 1.370072078), (190.096751538, 1.503436562))
        make_face()
    boss_extrude2 = extrude(amount=-BOSS_EXTRUDE2_DEPTH)

    # Fillet1
    fillet1_edges = [part.edges().sort_by_distance(p)[0] for p in [
        (188.851508166, 5, 1.394491884),
        (188.851508166, 5, -1.394491884),
    ]]
    fillet(fillet1_edges, radius=FILLET1_R)

    # CirPattern1: Boss-Extrude2 ×19 about axis, 8 skipped
    cirpattern1_axis = Axis((172.912392996, 0, 0), (0, -1, 0))
    add([boss_extrude2.rotate(cirpattern1_axis, i * CIRPATTERN1_ANGLE / (CIRPATTERN1_COUNT - 1)) for i in range(1, CIRPATTERN1_COUNT) if i not in (11, 12, 13, 14, 15, 16, 17, 18)])

    # Fillet1 of CirPattern1
    fillet1_of_cirpattern1_edges = [part.edges().sort_by_distance(p)[0] for p in [
        (187.478200052, 5, 6.620971592),
        (188.406632365, 5, 3.991058305),
        (184.443362059, 5, 11.092193312),
        (186.194319884, 5, 8.921346207),
        (180.093179879, 5, 14.298122245),
        (182.466930463, 5, 12.833971084),
        (174.923881264, 5, 15.873056257),
        (177.649649531, 5, 15.282617594),
        (169.52513104, 5, 15.637341732),
        (172.291987056, 5, 15.98796724),
        (164.512767711, 5, 13.617866759),
        (167.005094639, 5, 14.869560388),
        (160.458554405, 5, 10.044993995),
        (162.392051099, 5, 12.054974341),
        (157.824957537, 5, 5.326283064),
        (158.979068931, 5, 7.865270529),
        (156.912392996, 5, 0),
        (157.155468948, 5, 2.778370843),
        (157.824957537, 5, -5.326283064),
        (157.129270235, 5, -2.625459183),
    ]]
    fillet(fillet1_of_cirpattern1_edges, radius=FILLET1_OF_CIRPATTERN1_R)

    # Sketch4 → Cut-Extrude2 (cut, through all)
    with BuildSketch(Plane(origin=(0, 10, 0), x_dir=(1, 0, 0), z_dir=(0, 1, 0))):
        with Locations((172.912392996, 0)):
            Circle(SKETCH4_R)
    extrude(amount=-CUT_EXTRUDE2_DEPTH, mode=Mode.SUBTRACT)

    # Sketch5 → Cut-Extrude3 (cut, through all)
    with BuildSketch(Plane(origin=(0, 10, 0), x_dir=(1, 0, 0), z_dir=(0, 1, 0))):
        with Locations((169.092781716, 61.667339115)):
            Circle(SKETCH5_R)
        with Locations((177.33165748, 41.535482158)):
            Circle(SKETCH5_R)
        with Locations((175.039520306, 17.401914698)):
            Circle(SKETCH5_R)
        with Locations((159.593070103, 87.196340656)):
            Circle(SKETCH5_R)
    extrude(amount=-CUT_EXTRUDE3_DEPTH, mode=Mode.SUBTRACT)


solid = part.part
